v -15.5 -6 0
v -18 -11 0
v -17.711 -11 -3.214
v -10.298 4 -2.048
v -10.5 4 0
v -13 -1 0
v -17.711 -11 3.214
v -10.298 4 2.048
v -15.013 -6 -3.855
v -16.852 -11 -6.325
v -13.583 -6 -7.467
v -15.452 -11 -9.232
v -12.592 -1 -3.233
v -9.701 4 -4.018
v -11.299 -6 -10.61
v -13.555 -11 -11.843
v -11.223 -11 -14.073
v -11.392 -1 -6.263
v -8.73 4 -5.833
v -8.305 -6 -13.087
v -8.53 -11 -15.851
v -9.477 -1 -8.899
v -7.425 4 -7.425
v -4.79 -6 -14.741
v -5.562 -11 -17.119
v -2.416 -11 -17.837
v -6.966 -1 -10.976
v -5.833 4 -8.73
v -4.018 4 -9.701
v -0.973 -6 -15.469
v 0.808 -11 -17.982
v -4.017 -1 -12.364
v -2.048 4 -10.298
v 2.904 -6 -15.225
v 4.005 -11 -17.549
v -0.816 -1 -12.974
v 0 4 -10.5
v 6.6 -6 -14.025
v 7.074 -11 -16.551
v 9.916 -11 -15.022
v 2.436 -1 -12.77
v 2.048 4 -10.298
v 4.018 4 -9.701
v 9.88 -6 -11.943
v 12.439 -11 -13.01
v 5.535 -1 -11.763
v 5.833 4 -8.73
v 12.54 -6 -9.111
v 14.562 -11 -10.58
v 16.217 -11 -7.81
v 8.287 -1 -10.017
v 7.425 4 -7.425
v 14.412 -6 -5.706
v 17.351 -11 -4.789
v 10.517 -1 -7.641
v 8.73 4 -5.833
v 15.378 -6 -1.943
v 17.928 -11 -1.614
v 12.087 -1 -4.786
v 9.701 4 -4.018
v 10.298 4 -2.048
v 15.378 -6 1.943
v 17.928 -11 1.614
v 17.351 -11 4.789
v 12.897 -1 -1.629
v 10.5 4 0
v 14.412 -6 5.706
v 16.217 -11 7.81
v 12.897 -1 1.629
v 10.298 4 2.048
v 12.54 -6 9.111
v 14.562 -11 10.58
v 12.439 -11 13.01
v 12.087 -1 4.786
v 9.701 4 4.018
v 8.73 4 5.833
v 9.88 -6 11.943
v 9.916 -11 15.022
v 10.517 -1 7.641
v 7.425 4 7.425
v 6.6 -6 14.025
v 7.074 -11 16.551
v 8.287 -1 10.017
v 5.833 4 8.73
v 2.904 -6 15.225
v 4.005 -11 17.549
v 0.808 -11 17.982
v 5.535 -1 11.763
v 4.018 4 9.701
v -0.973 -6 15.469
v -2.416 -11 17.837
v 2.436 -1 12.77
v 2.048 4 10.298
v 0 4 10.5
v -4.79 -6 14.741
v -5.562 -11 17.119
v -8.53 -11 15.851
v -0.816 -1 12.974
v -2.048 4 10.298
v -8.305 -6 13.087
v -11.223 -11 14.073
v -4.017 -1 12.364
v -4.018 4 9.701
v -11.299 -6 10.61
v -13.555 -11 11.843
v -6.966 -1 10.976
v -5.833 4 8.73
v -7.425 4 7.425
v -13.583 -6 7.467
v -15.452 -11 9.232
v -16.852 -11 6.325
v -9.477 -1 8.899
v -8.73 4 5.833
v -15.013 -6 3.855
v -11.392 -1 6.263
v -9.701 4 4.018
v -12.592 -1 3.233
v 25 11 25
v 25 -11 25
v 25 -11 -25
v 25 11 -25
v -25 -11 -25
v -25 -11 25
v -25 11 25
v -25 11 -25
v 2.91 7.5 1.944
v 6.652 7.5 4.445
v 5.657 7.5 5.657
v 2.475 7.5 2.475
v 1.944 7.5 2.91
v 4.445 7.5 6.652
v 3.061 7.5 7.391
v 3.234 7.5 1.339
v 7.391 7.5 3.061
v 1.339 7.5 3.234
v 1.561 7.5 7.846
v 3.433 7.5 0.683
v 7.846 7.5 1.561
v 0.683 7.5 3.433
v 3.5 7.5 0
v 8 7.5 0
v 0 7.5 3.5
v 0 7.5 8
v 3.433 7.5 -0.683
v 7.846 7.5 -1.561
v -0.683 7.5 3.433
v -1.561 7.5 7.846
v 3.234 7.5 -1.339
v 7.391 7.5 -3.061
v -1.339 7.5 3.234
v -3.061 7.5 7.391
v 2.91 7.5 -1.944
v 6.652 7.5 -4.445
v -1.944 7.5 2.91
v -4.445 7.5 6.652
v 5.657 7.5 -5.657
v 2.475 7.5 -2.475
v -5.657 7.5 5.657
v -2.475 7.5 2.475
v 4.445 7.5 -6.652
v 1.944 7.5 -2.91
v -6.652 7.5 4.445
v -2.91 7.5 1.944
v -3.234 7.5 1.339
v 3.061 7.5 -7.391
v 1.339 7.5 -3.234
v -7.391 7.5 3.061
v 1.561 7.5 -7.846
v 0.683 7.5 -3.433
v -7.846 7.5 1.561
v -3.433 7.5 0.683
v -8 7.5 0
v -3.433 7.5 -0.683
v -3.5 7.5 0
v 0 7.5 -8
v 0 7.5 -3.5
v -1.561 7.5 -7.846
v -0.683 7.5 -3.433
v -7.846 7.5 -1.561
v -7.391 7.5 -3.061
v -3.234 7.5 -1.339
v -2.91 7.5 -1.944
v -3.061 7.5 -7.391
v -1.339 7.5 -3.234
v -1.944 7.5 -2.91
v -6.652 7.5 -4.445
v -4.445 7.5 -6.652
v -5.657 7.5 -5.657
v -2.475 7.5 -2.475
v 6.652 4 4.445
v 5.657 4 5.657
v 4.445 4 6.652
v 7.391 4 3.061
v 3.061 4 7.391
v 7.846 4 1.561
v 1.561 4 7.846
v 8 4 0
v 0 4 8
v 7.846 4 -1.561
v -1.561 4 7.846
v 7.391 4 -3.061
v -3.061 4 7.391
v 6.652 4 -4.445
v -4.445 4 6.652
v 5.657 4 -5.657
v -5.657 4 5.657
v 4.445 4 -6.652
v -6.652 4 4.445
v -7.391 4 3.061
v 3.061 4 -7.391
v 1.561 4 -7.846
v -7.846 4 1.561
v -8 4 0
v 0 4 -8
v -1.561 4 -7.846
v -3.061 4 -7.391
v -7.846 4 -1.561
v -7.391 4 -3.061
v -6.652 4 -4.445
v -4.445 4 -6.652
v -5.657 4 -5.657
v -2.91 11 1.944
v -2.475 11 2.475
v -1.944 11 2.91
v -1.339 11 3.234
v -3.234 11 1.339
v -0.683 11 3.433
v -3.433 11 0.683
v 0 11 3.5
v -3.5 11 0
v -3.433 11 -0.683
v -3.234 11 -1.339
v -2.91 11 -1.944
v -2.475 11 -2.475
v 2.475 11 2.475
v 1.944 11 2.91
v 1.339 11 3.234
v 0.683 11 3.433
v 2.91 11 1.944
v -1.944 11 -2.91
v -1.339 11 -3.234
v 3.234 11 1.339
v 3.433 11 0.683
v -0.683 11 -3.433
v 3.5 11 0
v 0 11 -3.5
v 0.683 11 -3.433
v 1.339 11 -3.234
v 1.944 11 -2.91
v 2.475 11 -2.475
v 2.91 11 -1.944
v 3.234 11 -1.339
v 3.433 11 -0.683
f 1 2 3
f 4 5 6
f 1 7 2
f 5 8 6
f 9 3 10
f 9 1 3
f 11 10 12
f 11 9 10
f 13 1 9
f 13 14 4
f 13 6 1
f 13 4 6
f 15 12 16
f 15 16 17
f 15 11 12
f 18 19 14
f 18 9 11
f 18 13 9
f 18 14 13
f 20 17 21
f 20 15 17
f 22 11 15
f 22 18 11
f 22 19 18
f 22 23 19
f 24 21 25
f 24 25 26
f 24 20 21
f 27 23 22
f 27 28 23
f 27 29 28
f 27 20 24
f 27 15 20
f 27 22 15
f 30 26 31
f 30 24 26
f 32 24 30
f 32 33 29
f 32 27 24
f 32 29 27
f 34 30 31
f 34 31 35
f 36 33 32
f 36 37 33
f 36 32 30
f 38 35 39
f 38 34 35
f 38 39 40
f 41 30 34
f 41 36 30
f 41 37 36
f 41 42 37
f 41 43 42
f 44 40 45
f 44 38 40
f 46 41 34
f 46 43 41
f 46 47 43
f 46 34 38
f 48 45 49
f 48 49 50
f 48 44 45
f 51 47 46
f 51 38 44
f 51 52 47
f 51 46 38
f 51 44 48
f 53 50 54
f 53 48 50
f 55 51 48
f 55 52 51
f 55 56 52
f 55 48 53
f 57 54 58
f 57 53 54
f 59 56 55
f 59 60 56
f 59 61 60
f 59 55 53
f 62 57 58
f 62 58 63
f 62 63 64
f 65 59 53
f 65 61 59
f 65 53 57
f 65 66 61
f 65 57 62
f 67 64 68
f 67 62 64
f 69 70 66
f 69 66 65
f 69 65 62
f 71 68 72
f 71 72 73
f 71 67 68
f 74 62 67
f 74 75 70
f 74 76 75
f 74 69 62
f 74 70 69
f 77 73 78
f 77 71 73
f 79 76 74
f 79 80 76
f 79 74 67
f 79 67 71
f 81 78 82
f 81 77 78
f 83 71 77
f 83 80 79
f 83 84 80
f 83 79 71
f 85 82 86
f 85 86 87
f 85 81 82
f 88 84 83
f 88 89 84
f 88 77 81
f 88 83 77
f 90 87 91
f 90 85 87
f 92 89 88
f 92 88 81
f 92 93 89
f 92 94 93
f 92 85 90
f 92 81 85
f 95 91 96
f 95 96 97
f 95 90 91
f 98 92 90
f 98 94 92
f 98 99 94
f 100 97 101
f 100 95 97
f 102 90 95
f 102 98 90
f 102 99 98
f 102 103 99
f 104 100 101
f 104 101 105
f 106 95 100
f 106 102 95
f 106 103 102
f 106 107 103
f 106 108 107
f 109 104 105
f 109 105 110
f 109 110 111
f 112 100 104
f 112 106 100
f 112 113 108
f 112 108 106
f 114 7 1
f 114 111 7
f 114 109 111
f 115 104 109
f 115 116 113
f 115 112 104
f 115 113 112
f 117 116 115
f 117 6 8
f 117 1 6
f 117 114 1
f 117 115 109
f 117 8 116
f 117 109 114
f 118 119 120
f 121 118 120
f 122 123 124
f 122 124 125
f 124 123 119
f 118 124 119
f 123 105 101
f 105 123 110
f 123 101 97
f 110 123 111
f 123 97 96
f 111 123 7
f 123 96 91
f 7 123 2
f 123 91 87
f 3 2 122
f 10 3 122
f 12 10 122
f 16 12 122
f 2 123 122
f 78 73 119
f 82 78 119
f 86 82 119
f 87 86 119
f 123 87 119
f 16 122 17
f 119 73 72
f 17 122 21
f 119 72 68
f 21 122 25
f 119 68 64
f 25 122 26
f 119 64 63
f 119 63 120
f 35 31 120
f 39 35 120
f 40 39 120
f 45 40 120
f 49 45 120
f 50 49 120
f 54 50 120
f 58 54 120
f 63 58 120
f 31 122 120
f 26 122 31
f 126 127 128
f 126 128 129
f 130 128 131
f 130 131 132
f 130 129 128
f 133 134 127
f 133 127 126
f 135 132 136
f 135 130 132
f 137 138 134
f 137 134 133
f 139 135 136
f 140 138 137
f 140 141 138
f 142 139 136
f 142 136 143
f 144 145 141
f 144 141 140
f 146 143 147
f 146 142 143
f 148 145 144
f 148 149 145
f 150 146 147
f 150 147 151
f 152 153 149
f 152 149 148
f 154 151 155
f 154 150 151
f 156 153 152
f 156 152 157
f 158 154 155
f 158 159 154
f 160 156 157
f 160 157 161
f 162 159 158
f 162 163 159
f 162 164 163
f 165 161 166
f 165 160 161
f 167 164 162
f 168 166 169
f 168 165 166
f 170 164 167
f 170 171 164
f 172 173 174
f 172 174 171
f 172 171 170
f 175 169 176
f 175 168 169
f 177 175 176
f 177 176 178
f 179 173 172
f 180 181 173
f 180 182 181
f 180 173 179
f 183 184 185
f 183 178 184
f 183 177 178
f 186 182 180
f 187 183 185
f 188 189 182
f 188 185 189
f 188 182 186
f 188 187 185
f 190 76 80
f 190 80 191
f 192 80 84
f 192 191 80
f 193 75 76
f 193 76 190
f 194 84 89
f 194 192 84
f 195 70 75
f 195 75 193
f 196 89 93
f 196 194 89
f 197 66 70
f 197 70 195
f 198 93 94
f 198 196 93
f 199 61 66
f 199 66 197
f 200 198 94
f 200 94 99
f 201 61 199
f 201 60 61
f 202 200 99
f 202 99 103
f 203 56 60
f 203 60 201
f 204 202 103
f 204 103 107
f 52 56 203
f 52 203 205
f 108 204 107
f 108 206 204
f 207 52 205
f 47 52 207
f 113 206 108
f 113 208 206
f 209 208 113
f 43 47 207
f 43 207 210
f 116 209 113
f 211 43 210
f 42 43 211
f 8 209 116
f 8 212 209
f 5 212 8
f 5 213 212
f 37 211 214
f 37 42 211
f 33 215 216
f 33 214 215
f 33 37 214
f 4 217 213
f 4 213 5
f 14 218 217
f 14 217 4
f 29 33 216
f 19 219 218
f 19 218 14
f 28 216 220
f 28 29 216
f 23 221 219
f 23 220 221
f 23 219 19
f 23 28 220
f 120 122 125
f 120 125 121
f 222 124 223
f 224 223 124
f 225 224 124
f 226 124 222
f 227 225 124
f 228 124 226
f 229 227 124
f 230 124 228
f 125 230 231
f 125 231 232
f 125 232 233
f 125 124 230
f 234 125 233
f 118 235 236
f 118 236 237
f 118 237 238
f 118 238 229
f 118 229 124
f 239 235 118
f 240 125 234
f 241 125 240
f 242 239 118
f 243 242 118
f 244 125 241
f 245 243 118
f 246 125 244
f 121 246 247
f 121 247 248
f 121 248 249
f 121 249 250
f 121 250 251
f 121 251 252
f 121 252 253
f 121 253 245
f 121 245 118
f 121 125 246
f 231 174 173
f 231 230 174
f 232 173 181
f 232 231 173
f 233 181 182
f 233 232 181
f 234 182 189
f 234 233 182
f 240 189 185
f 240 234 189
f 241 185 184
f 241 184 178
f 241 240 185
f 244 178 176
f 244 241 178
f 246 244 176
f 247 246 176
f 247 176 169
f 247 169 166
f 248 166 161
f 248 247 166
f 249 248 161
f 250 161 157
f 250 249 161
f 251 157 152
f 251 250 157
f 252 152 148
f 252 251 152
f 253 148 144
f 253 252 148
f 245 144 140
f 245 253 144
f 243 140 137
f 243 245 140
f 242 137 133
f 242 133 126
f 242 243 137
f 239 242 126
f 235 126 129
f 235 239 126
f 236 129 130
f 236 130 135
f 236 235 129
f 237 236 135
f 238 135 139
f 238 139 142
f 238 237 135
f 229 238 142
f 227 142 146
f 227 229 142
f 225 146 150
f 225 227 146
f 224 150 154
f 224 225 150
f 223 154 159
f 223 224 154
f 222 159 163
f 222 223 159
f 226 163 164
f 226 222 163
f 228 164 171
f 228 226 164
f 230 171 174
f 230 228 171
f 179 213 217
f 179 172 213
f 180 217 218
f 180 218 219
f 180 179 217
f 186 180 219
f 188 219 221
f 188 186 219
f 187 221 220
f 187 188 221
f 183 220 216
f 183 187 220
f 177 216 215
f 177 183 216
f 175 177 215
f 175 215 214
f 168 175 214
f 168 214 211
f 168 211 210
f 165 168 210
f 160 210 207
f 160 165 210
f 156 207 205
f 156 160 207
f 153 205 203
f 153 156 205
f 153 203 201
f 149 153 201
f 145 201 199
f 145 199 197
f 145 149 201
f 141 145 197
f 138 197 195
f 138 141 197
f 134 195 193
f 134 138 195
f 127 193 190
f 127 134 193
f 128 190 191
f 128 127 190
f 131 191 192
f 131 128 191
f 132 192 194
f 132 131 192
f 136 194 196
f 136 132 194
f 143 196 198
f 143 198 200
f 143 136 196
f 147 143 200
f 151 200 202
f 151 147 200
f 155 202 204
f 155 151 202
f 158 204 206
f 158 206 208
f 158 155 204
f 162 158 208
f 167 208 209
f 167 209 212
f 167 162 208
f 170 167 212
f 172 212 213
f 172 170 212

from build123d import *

# Parameters (mm, degrees)
BOSS_EXTRUDE1_DEPTH      = 11
BOSS_EXTRUDE1_DEPTH_BACK = 11
SKETCH1_W                = 50
SKETCH1_H                = 50


with BuildPart() as part:
    # Sketch1 → Boss-Extrude1 (new, two sides: drawn at the far end of the back side and taken through both)
    with BuildSketch(Plane(origin=(0, 0, 0), x_dir=(1, 0, 0), z_dir=(0, 1, 0)).offset(-BOSS_EXTRUDE1_DEPTH_BACK)):
        Rectangle(SKETCH1_W, SKETCH1_H)
    extrude(amount=BOSS_EXTRUDE1_DEPTH + BOSS_EXTRUDE1_DEPTH_BACK)

    # Sketch2 → Cut-Revolve1 (revolve, cut)
    with BuildSketch(Plane.XY):
        Polygon((-3.5, 7.5), (-3.5, 11), (0, 11), (0, -11), (-18, -11), (-10.5, 4), (-8, 4), (-8, 7.5), align=None)
    revolve(axis=Axis((0, 11, 0), (0, -1, 0)), mode=Mode.SUBTRACT)


solid = part.part
